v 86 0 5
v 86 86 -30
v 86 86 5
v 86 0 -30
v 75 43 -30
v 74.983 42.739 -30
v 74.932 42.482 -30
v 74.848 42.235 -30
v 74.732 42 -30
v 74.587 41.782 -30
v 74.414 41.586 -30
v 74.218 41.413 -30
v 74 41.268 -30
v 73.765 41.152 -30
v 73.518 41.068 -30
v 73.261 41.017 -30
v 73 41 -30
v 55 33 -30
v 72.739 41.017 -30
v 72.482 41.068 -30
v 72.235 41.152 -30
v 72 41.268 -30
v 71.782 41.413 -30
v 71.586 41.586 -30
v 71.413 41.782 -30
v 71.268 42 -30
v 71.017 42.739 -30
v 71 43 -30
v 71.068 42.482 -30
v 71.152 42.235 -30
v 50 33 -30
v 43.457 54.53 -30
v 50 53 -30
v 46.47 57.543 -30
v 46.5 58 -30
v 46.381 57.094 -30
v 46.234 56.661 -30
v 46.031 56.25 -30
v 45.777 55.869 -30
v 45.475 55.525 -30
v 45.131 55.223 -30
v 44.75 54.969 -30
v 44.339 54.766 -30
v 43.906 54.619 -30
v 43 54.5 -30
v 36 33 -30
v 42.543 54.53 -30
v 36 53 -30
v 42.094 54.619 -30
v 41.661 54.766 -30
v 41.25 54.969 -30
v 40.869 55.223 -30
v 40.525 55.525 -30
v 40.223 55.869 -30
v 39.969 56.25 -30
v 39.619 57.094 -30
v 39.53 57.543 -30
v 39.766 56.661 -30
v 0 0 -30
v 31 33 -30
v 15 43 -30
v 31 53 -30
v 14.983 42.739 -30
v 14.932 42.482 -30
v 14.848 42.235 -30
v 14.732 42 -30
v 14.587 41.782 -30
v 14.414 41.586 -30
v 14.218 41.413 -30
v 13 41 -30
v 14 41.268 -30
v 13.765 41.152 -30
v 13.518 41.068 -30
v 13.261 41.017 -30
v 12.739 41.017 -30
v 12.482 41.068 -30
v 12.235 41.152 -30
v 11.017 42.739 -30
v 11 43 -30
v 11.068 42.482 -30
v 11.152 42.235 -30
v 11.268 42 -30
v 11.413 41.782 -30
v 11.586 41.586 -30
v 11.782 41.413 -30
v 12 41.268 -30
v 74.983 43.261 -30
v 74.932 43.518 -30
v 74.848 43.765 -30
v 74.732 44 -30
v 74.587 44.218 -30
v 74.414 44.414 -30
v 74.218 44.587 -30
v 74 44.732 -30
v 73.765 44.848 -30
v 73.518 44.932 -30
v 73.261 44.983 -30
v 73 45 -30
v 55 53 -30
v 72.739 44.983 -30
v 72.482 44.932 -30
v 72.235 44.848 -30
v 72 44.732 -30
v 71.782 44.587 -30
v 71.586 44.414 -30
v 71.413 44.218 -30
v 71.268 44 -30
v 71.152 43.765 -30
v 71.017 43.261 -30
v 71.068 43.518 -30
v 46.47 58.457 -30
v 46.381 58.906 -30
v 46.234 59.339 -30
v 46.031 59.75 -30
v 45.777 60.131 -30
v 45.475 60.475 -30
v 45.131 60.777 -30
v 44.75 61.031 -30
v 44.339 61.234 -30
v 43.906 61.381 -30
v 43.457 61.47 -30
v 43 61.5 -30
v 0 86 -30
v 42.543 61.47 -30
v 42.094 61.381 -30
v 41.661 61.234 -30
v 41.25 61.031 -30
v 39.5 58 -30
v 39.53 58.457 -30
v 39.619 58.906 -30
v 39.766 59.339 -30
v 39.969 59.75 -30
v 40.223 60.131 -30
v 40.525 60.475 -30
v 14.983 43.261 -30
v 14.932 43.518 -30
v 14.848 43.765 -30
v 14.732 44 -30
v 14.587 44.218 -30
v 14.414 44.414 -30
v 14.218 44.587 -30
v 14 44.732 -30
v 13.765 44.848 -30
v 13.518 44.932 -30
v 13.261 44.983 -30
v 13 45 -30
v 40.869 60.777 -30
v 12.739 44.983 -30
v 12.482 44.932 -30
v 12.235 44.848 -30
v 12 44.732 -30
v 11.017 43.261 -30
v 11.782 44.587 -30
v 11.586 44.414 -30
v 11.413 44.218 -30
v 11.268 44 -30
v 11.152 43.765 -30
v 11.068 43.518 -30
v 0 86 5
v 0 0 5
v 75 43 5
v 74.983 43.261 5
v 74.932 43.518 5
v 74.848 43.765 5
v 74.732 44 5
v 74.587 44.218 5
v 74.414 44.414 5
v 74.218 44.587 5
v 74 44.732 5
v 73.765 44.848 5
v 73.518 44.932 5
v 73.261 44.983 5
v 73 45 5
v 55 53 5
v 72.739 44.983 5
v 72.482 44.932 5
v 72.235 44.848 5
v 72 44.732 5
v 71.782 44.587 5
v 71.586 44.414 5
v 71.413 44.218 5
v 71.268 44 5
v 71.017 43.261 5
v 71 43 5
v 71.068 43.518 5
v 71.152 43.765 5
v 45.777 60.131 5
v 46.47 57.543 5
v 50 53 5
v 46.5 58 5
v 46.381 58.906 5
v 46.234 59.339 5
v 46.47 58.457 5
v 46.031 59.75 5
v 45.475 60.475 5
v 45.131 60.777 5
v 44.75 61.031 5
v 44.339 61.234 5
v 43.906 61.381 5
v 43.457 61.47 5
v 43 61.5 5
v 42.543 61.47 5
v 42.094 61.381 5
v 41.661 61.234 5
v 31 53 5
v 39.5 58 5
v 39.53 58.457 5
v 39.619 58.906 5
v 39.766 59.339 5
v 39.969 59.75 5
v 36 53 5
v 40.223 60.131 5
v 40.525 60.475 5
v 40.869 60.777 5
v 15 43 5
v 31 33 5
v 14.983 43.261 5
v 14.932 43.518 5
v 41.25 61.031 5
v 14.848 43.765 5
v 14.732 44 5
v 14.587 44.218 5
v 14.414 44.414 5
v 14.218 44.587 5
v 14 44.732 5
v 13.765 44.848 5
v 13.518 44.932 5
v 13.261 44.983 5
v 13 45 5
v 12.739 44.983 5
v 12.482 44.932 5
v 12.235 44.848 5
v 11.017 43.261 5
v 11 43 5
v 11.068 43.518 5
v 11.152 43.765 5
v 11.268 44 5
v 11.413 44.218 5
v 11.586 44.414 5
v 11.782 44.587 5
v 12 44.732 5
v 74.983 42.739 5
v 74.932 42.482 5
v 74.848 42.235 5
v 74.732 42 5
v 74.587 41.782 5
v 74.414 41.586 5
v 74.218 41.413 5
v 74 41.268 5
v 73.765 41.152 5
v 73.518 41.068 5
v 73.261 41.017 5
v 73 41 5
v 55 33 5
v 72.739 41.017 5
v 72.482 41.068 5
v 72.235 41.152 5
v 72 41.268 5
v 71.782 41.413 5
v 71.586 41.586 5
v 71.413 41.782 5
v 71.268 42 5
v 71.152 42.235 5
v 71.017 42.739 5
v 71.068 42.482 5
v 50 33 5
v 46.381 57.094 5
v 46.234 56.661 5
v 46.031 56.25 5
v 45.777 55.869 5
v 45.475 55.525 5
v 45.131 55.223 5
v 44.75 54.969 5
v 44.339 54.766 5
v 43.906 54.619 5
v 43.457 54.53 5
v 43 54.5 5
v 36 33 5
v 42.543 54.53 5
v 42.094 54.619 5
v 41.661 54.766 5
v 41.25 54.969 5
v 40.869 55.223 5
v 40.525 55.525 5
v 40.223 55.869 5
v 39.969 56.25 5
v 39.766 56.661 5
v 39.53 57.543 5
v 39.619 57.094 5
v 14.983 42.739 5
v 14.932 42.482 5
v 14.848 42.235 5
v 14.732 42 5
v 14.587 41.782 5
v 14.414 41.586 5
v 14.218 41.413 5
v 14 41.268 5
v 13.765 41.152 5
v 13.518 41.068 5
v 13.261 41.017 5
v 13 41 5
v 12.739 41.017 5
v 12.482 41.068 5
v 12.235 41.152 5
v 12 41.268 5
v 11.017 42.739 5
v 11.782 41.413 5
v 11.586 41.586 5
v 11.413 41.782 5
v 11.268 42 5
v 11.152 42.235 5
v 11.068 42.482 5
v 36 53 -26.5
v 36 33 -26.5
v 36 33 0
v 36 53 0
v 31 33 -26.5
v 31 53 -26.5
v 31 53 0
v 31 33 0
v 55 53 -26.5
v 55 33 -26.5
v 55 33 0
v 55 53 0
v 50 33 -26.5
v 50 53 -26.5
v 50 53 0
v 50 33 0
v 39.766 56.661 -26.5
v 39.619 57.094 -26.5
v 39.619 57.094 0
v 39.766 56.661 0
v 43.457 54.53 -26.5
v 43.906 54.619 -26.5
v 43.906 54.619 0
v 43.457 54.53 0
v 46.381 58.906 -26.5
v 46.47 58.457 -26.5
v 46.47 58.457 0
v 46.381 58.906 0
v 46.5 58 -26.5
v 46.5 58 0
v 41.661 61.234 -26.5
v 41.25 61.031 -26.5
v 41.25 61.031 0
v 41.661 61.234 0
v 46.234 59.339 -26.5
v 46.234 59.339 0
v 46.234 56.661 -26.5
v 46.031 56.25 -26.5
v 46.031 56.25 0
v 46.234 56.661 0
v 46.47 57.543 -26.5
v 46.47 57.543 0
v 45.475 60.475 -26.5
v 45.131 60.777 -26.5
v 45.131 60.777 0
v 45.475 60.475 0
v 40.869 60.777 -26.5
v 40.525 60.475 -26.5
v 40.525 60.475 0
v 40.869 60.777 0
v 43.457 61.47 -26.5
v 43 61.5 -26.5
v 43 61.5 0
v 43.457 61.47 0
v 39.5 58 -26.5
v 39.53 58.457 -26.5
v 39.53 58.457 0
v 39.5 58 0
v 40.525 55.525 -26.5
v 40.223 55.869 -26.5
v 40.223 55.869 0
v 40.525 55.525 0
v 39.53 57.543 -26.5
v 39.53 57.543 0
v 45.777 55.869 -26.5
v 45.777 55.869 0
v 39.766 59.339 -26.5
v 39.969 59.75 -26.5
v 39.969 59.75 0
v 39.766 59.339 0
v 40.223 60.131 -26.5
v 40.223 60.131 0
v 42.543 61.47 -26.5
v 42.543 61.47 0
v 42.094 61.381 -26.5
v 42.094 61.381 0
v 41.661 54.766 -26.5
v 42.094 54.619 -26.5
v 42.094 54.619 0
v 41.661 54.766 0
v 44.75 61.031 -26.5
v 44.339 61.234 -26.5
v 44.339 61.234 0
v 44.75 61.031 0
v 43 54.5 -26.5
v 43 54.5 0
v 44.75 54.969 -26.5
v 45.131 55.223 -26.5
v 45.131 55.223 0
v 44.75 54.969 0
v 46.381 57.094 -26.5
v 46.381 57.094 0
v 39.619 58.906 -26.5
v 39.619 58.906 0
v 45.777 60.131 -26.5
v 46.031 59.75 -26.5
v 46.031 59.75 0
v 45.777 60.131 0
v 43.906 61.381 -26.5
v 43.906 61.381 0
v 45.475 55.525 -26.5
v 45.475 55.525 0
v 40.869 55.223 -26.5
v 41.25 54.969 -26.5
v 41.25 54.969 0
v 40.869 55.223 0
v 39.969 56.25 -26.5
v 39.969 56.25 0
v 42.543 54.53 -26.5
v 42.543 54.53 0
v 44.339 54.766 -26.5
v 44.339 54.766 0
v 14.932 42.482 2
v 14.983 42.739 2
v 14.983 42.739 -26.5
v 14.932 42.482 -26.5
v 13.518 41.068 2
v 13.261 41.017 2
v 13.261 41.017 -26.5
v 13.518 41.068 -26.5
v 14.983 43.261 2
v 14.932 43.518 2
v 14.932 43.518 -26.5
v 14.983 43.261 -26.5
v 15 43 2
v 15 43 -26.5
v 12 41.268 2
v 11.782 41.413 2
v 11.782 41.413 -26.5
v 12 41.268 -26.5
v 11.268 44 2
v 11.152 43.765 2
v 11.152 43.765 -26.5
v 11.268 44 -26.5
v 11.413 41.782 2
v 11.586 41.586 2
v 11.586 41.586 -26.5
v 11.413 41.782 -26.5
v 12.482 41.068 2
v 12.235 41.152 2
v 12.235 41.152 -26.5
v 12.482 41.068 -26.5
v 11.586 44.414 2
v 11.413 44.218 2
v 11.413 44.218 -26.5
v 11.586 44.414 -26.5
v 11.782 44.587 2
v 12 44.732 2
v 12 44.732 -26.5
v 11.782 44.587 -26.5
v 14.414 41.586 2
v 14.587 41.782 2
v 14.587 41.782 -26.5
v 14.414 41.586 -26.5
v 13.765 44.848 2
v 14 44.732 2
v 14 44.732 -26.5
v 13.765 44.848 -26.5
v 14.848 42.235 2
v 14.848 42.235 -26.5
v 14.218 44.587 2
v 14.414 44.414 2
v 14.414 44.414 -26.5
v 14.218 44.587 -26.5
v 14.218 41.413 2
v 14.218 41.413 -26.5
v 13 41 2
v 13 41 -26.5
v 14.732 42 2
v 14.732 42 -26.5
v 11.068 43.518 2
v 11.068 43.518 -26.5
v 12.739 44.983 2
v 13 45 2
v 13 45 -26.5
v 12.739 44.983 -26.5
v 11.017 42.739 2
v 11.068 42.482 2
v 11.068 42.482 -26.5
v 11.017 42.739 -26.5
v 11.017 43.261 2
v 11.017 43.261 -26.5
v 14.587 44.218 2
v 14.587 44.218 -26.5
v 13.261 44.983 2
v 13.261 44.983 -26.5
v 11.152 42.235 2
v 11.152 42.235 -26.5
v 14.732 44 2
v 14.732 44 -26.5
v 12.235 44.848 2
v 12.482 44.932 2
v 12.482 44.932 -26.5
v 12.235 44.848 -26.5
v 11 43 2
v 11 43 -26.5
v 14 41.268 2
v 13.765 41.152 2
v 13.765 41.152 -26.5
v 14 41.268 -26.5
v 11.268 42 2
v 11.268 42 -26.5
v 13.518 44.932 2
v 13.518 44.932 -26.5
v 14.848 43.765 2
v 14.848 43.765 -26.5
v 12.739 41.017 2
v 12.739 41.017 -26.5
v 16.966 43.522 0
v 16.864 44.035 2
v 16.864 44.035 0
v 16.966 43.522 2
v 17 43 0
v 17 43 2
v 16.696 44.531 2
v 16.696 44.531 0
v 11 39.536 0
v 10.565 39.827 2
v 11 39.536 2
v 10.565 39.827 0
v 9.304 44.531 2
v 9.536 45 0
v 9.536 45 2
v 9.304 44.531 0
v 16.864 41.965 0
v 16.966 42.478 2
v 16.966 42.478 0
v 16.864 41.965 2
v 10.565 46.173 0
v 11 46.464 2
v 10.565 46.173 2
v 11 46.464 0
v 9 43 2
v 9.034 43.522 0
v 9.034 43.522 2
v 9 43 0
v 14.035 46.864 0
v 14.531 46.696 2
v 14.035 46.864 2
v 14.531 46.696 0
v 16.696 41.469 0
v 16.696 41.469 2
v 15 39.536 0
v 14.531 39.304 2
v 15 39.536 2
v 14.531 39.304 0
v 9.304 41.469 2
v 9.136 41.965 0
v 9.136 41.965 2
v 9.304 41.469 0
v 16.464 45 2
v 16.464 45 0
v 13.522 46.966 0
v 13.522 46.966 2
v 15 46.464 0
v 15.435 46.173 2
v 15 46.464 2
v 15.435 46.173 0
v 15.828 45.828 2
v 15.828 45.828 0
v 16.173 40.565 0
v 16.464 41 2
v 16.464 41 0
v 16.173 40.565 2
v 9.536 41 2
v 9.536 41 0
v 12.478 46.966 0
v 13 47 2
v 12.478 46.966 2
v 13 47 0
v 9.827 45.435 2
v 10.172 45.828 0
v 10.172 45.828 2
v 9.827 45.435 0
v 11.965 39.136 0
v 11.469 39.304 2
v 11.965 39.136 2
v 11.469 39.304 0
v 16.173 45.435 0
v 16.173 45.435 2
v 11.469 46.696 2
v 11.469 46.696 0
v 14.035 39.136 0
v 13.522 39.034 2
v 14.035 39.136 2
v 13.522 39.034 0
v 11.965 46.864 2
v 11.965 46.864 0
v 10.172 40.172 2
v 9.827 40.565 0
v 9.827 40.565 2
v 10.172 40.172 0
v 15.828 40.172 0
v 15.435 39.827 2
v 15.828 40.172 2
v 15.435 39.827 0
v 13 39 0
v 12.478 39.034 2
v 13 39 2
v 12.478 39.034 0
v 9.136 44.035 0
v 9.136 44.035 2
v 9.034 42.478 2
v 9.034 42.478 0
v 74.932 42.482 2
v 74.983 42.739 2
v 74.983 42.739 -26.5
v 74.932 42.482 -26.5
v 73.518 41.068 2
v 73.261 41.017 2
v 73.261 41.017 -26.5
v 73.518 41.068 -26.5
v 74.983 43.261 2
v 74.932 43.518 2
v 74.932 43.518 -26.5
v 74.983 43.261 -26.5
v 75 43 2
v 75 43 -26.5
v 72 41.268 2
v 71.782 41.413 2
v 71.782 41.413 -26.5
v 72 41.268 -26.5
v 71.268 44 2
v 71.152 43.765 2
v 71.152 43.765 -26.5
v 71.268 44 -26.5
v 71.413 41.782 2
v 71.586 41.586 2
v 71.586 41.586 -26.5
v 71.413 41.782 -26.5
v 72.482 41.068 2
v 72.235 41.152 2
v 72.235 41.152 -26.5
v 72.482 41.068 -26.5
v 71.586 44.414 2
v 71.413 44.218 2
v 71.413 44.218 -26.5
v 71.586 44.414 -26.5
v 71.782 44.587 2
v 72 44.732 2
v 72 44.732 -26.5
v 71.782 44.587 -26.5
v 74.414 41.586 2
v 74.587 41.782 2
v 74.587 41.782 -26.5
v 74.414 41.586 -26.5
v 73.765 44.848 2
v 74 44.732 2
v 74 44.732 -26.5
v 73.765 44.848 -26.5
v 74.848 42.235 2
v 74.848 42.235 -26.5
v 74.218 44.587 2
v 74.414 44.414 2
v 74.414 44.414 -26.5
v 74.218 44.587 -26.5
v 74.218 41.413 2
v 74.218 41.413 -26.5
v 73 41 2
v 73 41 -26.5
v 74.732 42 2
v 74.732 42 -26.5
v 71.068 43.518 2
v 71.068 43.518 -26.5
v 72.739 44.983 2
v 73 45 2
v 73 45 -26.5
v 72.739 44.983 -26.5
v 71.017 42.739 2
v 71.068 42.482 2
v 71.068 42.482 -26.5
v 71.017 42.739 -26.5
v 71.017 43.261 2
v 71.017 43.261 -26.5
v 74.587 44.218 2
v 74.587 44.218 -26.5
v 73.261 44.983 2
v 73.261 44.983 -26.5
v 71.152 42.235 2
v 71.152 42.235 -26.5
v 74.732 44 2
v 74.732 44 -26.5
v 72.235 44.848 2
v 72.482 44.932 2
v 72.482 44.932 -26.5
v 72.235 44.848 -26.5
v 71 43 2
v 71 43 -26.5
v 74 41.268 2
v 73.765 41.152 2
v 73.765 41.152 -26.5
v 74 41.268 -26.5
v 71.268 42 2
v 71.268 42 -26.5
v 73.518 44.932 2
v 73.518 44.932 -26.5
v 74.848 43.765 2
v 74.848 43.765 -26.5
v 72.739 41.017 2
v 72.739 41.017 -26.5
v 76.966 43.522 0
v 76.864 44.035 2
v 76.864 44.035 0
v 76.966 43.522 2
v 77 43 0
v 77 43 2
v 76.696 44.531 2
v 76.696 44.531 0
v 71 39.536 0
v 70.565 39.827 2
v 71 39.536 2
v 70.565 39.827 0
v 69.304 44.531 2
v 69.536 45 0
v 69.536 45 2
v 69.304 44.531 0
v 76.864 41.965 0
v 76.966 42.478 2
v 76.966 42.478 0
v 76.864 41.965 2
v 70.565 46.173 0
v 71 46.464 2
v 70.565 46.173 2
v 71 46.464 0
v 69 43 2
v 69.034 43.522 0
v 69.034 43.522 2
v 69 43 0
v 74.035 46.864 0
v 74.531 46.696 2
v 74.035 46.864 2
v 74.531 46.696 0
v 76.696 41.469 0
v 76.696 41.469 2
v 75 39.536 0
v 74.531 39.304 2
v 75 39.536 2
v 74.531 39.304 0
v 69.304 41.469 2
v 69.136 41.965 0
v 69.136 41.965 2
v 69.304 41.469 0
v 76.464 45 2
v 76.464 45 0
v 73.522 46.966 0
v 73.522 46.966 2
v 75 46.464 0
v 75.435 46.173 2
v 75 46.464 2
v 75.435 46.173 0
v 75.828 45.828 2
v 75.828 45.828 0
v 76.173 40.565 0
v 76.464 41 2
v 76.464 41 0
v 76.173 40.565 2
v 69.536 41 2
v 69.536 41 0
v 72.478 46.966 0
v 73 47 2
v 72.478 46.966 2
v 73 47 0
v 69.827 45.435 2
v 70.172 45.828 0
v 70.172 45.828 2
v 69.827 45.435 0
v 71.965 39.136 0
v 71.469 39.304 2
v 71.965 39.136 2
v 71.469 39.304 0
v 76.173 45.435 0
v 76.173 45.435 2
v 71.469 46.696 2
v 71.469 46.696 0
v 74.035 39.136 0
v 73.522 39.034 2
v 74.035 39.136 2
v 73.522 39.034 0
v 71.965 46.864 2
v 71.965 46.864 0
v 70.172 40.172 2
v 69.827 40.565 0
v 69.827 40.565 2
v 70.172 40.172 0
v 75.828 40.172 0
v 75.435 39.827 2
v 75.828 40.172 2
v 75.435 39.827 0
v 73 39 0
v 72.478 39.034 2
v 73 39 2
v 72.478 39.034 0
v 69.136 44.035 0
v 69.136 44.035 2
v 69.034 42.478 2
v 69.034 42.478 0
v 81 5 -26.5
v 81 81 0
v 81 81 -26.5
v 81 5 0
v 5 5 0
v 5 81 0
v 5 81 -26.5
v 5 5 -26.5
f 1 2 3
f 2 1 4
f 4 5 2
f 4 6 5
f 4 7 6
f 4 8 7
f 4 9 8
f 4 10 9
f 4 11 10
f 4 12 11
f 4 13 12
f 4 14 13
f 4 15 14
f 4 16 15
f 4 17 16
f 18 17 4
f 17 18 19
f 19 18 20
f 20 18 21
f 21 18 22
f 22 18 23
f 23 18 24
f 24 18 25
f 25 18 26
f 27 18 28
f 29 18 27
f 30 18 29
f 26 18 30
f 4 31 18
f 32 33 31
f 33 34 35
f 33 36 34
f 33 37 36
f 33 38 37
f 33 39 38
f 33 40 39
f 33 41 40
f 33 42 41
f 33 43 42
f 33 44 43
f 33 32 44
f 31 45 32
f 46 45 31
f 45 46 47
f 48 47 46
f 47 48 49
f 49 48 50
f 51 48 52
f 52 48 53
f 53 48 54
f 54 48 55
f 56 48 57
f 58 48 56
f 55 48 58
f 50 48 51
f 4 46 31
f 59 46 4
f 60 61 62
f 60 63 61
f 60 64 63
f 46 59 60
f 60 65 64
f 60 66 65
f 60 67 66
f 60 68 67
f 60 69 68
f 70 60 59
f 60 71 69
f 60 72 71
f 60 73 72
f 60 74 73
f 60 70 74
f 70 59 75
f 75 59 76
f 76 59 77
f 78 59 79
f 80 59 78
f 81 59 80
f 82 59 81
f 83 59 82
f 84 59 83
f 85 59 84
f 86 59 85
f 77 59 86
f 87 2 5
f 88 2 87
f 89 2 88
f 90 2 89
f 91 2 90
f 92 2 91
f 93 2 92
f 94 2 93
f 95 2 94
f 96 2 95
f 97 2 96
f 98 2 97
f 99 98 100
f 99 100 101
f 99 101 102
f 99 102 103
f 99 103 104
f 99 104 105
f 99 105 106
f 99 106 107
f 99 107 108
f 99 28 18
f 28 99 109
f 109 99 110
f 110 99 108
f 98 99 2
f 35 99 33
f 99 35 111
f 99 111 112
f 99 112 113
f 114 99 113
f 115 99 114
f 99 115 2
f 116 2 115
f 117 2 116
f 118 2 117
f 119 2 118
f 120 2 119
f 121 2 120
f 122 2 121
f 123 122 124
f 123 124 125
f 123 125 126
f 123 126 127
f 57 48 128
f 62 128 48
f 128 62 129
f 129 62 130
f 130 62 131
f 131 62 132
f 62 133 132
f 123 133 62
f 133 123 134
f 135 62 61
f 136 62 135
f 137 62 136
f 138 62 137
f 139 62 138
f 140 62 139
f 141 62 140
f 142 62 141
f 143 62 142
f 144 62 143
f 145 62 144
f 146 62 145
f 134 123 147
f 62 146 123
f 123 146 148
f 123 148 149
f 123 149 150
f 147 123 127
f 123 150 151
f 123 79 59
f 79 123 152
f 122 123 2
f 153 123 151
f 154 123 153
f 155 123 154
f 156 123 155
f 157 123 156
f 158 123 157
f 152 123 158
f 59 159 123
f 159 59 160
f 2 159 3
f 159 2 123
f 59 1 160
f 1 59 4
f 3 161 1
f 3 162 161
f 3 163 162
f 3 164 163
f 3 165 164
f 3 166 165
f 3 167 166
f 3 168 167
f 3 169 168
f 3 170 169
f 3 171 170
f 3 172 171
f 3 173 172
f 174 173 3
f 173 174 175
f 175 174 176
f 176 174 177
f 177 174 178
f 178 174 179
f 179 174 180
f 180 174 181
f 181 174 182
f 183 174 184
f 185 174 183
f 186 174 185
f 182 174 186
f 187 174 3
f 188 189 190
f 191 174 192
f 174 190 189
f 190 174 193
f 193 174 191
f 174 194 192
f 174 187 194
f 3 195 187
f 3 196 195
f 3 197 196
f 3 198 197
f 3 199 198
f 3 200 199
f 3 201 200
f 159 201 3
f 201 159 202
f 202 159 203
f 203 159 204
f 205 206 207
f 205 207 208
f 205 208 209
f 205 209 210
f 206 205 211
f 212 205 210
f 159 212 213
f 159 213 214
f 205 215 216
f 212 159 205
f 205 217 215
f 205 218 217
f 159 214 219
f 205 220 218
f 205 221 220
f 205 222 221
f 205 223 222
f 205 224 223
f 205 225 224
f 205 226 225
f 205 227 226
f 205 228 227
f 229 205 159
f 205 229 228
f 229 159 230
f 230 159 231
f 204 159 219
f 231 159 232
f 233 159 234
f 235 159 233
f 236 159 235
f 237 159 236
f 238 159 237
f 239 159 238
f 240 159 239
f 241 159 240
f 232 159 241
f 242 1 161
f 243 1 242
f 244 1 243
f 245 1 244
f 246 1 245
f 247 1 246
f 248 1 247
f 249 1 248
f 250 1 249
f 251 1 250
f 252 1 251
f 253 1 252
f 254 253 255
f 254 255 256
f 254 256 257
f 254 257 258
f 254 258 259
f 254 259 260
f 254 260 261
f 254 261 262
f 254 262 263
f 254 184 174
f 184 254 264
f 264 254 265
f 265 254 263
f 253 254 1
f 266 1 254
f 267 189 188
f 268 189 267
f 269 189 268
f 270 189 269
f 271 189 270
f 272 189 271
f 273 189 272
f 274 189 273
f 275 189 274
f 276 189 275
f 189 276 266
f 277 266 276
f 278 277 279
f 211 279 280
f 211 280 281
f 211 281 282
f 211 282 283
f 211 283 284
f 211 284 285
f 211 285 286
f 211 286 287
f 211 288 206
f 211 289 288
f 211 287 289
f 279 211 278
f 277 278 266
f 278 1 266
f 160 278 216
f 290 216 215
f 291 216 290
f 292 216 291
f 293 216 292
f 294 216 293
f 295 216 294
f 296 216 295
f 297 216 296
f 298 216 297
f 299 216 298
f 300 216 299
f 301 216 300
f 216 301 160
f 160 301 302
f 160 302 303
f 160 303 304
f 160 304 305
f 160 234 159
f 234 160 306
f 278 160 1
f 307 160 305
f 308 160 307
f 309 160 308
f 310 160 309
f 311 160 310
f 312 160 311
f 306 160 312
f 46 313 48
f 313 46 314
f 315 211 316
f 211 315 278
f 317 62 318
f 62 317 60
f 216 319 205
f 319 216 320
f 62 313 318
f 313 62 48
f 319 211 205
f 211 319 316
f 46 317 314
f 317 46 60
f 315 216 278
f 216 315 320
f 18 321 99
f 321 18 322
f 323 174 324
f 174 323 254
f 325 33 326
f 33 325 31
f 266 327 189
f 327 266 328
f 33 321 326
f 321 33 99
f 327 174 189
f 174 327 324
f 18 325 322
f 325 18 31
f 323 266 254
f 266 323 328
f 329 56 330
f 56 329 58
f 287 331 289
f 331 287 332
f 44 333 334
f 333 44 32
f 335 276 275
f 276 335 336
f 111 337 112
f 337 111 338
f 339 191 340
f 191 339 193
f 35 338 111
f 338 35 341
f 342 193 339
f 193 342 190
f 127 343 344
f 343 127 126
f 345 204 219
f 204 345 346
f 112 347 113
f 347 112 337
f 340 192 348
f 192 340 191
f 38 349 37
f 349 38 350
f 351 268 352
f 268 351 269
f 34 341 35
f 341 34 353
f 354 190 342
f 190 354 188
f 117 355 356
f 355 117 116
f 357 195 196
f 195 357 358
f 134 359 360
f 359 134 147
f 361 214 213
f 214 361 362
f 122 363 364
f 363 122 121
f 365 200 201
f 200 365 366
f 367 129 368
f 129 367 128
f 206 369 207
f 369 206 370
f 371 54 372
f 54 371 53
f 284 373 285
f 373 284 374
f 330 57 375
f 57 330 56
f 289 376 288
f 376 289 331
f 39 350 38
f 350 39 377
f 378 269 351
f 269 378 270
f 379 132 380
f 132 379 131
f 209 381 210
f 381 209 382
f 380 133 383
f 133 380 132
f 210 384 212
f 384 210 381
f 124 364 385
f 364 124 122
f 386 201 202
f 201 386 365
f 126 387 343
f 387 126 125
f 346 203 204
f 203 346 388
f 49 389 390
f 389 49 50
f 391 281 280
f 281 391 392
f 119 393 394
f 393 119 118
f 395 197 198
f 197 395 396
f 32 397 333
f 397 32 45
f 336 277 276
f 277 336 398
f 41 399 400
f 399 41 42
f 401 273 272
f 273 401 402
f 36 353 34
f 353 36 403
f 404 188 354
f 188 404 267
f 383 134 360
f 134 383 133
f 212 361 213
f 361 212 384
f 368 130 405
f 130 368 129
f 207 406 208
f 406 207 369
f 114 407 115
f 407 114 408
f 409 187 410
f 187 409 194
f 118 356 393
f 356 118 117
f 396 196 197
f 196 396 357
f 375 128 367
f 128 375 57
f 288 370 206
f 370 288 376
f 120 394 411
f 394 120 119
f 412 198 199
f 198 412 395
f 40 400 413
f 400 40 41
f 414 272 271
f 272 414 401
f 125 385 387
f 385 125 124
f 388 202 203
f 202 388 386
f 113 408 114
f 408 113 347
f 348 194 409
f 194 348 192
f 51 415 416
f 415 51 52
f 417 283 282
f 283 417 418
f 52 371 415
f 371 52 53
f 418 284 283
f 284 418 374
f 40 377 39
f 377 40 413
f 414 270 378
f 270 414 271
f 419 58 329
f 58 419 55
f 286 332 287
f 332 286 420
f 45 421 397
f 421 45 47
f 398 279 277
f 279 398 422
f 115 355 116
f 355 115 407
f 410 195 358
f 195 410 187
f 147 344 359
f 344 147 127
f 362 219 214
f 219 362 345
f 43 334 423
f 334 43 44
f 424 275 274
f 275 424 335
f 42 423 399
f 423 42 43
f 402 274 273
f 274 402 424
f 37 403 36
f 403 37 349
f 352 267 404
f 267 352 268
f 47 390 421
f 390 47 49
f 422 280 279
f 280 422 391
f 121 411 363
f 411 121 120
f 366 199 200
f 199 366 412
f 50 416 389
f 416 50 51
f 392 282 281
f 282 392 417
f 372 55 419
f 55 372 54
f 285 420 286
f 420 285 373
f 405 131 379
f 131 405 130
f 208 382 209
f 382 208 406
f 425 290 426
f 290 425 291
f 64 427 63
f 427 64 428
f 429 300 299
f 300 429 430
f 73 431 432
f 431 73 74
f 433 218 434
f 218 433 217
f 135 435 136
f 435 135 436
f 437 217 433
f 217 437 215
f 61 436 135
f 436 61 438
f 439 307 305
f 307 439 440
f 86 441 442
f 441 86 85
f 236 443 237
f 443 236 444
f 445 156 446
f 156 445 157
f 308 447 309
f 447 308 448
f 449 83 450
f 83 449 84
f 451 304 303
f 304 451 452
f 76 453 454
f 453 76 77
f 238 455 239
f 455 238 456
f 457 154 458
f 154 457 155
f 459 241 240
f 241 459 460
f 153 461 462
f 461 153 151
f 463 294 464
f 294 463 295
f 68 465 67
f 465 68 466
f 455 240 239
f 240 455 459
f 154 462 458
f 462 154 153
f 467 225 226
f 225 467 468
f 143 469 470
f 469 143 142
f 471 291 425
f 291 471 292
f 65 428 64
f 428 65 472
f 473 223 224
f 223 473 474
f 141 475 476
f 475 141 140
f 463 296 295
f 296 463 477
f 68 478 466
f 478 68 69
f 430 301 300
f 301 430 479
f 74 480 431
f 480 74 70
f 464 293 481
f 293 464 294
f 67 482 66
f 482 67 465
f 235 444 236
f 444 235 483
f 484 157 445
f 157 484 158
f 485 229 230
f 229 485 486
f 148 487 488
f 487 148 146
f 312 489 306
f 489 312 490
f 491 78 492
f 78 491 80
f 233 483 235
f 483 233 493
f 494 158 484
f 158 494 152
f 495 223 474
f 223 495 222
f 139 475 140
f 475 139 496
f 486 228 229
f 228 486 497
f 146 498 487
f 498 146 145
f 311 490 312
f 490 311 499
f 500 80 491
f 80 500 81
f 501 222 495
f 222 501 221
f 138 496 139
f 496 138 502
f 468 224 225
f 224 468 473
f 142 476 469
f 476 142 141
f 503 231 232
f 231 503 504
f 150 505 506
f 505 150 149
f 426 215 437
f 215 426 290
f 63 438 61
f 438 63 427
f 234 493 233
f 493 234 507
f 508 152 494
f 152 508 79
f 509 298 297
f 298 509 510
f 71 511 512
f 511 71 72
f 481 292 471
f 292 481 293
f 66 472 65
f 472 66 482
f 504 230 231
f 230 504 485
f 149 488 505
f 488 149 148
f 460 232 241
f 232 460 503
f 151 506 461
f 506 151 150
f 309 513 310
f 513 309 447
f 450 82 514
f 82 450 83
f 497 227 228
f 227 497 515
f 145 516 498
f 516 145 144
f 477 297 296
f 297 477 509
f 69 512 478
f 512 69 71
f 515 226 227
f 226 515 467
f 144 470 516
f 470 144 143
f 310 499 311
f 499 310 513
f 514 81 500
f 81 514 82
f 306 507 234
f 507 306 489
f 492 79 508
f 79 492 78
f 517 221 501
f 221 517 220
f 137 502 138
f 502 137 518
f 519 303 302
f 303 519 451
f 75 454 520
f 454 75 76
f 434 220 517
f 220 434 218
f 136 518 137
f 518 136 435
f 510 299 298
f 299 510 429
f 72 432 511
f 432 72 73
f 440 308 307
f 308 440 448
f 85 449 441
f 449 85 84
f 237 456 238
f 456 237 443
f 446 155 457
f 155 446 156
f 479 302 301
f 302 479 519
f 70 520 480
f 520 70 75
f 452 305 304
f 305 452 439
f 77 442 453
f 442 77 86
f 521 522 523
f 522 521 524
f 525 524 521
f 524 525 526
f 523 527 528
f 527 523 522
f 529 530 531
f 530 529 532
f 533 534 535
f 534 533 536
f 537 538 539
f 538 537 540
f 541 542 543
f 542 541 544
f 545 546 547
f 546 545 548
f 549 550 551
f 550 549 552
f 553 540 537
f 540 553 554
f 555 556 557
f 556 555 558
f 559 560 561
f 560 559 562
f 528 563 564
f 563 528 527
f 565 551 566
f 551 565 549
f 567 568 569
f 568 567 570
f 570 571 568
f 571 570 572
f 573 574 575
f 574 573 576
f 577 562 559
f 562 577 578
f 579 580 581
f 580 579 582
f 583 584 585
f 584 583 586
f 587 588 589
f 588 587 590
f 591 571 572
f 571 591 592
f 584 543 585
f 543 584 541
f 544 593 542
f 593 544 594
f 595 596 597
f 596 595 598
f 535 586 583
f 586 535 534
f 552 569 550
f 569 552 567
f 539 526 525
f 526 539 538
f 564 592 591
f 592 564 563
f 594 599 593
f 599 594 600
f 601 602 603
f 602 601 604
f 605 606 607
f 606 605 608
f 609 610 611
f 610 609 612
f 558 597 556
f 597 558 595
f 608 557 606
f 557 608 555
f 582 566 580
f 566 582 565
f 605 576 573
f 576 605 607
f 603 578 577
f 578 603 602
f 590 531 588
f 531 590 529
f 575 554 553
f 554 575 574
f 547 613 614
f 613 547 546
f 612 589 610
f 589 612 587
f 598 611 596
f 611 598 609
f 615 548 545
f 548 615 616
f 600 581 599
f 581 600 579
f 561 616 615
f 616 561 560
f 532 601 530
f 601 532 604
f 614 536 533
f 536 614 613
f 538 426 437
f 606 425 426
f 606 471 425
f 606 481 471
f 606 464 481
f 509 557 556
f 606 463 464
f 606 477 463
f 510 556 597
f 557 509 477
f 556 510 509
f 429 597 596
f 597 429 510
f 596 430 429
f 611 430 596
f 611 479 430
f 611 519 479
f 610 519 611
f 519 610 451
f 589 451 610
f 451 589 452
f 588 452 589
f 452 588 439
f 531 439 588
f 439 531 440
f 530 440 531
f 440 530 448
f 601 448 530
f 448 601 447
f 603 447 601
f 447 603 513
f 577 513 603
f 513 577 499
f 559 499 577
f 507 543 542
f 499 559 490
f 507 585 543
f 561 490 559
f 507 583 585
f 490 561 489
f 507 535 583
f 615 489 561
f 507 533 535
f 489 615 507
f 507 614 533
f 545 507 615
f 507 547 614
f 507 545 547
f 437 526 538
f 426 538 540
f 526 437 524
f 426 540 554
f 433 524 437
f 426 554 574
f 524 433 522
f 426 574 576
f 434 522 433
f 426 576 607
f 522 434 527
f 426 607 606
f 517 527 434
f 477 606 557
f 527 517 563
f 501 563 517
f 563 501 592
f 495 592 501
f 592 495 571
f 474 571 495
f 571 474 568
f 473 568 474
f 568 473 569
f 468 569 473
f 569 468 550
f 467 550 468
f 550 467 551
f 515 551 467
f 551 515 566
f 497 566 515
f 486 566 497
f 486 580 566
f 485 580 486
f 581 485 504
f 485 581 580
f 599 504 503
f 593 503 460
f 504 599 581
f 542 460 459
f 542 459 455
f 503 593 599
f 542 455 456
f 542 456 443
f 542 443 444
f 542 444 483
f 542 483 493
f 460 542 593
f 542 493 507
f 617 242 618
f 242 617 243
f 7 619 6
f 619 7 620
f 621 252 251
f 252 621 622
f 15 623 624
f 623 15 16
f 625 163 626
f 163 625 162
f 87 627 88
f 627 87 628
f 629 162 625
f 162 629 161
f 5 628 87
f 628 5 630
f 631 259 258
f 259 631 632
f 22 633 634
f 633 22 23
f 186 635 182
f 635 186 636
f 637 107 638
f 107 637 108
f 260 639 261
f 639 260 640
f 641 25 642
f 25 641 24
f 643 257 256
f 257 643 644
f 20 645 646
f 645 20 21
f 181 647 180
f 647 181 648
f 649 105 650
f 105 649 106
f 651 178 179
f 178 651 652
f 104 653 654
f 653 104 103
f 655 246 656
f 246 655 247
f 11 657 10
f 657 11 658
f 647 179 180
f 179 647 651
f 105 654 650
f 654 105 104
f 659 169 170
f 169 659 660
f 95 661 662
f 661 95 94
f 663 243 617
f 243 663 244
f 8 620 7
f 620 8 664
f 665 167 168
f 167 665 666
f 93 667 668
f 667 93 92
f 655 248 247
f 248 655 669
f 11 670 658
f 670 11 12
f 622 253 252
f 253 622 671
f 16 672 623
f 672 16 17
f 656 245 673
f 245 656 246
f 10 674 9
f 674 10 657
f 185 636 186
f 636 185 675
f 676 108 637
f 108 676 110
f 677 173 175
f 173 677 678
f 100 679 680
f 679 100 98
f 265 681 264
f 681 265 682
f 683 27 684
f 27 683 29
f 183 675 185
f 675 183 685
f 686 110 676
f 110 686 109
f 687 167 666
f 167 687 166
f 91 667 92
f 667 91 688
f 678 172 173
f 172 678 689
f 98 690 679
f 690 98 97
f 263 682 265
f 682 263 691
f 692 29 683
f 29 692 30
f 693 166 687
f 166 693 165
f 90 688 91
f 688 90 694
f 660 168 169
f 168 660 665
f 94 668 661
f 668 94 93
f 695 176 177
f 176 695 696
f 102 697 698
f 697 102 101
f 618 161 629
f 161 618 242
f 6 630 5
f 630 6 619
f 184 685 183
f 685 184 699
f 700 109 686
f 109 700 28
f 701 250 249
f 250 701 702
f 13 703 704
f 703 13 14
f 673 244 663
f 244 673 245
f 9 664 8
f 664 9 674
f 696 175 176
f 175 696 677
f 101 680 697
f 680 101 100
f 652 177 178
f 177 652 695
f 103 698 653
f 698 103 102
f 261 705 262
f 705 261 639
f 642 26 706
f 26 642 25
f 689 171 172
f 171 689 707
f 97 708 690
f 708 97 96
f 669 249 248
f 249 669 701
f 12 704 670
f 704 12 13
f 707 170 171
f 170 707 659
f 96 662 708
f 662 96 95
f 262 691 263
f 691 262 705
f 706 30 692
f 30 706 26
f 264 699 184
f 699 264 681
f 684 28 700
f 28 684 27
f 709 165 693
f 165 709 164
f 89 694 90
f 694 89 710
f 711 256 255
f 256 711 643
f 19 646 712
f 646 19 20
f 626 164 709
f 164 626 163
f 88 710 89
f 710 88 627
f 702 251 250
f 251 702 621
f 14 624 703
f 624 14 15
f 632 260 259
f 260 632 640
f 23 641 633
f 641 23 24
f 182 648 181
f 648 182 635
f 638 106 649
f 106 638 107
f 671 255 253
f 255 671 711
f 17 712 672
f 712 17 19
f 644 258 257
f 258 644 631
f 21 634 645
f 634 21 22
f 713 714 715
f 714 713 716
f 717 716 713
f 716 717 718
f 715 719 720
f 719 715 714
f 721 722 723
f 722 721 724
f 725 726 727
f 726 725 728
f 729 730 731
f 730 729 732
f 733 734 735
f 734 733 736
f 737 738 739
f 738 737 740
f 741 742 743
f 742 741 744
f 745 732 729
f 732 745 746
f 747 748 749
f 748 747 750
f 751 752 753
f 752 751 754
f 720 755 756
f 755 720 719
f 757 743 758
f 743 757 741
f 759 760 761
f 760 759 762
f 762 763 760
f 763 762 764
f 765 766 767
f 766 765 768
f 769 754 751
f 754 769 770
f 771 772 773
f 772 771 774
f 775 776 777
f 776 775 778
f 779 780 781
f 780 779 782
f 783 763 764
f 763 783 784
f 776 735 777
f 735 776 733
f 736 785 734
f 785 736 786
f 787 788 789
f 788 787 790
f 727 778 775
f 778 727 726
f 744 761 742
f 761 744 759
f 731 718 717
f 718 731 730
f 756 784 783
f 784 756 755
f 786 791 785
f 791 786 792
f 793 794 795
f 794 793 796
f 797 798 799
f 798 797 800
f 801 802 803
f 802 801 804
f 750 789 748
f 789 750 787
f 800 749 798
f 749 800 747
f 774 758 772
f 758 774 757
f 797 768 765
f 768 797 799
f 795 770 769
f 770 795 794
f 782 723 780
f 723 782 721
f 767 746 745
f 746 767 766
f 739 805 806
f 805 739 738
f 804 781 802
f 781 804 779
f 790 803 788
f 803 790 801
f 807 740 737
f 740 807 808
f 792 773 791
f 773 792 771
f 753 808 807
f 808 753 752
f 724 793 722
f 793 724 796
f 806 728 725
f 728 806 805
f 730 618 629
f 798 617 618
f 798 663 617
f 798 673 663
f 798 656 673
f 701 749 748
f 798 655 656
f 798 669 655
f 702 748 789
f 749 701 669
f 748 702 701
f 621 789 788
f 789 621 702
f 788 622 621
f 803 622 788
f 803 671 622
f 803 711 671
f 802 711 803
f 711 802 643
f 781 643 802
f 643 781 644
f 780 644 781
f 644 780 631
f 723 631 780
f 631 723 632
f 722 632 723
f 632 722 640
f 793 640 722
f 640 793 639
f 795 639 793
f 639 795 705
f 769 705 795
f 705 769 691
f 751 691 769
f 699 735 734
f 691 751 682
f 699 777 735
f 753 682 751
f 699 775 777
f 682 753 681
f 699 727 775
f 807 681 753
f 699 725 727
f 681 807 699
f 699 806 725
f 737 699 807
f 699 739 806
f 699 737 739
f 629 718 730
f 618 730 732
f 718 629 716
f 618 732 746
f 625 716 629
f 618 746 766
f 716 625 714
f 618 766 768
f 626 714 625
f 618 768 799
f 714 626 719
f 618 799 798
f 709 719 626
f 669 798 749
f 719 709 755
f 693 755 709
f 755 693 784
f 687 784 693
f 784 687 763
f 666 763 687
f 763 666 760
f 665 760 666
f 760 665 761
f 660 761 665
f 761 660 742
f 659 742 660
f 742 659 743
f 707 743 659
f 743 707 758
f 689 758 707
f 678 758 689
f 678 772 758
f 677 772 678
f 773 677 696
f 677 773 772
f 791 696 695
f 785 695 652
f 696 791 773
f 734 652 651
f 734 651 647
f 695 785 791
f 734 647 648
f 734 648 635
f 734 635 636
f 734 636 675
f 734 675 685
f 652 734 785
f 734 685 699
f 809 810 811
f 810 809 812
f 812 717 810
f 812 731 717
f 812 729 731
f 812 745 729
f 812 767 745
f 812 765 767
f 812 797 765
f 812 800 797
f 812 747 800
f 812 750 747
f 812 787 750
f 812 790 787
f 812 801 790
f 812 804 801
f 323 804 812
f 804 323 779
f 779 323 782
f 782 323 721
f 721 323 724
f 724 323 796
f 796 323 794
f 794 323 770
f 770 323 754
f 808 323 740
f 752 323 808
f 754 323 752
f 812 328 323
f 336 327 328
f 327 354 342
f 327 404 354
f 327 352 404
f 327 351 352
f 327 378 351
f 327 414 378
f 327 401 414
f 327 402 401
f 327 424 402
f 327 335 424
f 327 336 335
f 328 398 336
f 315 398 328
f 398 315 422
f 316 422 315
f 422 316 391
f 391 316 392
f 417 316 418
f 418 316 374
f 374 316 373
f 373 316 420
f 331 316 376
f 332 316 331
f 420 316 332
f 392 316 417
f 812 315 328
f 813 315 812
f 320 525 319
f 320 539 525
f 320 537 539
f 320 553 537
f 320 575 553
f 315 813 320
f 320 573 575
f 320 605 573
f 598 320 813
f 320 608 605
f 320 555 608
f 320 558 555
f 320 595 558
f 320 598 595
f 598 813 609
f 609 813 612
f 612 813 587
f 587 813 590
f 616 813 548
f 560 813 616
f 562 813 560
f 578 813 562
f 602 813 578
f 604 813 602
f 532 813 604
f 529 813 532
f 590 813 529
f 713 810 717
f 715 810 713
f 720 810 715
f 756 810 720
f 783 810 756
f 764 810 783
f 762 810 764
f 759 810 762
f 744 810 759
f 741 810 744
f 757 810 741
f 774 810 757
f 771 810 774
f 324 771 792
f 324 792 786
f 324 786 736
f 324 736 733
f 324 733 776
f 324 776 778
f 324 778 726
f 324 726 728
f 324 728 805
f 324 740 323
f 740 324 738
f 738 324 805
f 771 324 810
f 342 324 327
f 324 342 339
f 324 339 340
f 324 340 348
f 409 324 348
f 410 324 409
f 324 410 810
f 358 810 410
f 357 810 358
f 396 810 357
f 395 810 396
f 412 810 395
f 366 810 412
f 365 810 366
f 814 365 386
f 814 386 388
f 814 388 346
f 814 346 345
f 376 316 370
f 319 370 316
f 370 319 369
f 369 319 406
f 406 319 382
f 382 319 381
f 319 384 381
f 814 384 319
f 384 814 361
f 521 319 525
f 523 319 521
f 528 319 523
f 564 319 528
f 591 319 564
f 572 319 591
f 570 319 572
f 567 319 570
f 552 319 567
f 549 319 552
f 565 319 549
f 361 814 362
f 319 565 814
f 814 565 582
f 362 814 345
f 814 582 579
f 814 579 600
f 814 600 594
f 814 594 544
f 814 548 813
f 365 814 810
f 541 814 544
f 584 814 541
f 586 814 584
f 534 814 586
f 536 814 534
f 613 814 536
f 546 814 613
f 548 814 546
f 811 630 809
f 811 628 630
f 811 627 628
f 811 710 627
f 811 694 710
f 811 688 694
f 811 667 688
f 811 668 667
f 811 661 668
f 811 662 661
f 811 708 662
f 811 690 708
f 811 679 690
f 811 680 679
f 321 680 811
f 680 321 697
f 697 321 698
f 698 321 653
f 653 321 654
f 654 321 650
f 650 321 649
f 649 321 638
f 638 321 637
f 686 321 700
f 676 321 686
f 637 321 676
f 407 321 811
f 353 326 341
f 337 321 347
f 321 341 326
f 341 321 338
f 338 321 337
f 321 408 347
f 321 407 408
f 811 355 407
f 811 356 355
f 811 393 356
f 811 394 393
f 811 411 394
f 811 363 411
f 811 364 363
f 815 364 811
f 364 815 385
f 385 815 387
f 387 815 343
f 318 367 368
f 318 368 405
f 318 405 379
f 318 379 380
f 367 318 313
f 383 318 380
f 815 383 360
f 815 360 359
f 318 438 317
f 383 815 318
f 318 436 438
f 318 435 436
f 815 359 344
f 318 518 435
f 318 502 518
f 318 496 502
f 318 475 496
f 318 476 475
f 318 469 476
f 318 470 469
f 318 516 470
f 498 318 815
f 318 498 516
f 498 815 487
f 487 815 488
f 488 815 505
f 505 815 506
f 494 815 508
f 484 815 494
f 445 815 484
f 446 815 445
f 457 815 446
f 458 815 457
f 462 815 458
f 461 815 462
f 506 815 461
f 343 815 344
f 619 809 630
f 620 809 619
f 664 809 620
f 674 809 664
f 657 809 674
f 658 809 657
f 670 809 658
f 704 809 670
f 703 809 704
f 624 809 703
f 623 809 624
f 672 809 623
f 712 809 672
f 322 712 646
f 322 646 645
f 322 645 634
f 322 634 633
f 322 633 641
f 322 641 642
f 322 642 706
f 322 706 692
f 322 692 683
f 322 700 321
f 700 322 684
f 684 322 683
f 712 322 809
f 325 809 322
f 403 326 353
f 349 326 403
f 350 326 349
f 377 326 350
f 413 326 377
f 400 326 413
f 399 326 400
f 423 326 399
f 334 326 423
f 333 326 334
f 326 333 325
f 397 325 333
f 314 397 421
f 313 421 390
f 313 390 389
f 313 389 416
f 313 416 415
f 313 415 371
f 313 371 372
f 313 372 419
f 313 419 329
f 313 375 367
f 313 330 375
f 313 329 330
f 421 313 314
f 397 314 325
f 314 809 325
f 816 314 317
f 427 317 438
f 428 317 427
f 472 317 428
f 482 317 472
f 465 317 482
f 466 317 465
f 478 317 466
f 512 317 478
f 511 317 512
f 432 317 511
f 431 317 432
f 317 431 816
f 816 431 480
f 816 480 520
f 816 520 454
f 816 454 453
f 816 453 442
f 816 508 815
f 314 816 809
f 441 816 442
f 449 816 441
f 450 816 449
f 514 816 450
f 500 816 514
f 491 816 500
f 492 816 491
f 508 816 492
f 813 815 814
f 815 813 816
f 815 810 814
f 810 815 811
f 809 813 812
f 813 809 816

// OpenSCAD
// Dimensions
faceplate_width = 86;
faceplate_height = 86;
faceplate_thickness = 5;
socket_body_depth = 30;

pin_aperture_width = 5;
pin_aperture_height = 20;
pin_aperture_spacing = 19;
earth_aperture_diameter = 7;

mounting_hole_diameter = 4;
mounting_hole_spacing = 60;
counterbore_diameter = 8;
counterbore_depth = 2;

// Connectivity overlap (1–2mm) to guarantee attachment
overlap = 1.5;

// Main function
module mains_socket() {
    union() {
        // Main blue body with all orange features CUT INTO it (not floating)
        difference() {
            union() {
                socket_body();
                faceplate_profile();
            }
            // Cutouts go slightly beyond the full depth to ensure clean boolean
            pin_apertures();
            internal_hollow();
            mounting_screw_holes();
        }
    }
}

// Socket body
module socket_body() {
    translate([0, 0, -socket_body_depth])
        cube([faceplate_width, faceplate_height, socket_body_depth], center=false);
}

// Faceplate profile
module faceplate_profile() {
    translate([0, 0, 0])
        cube([faceplate_width, faceplate_height, faceplate_thickness], center=false);
}

// Pin apertures (cut into faceplate/body; extend past both sides for robust difference)
module pin_apertures() {
    z0 = -socket_body_depth - overlap;
    h  = socket_body_depth + faceplate_thickness + 2*overlap;

    // Live/Neutral slots
    translate([
        faceplate_width/2 - pin_aperture_spacing/2 - pin_aperture_width/2,
        faceplate_height/2 - pin_aperture_height/2,
        z0
    ])
        cube([pin_aperture_width, pin_aperture_height, h], center=false);

    translate([
        faceplate_width/2 + pin_aperture_spacing/2 - pin_aperture_width/2,
        faceplate_height/2 - pin_aperture_height/2,
        z0
    ])
        cube([pin_aperture_width, pin_aperture_height, h], center=false);

    // Earth pin hole
    translate([
        faceplate_width/2,
        faceplate_height/2 + pin_aperture_height/2 + 5,
        z0
    ])
        cylinder(h=h, d=earth_aperture_diameter, center=false, $fn=48);
}

// Internal hollow (kept inside body; overlaps slightly to avoid thin uncut skins)
module internal_hollow() {
    wall = 5;
    z0 = -socket_body_depth + wall - overlap;
    h  = socket_body_depth - wall + overlap;

    translate([wall, wall, z0])
        cube([faceplate_width - 2*wall, faceplate_height - 2*wall, h], center=false);
}

// Mounting screw holes + counterbores (cut through; extend beyond for robust difference)
module mounting_screw_holes() {
    z0 = -socket_body_depth - overlap;
    h  = socket_body_depth + faceplate_thickness + 2*overlap;

    for (x = [-mounting_hole_spacing/2, mounting_hole_spacing/2]) {
        // Through hole
        translate([faceplate_width/2 + x, faceplate_height/2, z0])
            cylinder(h=h, d=mounting_hole_diameter, center=false, $fn=48);

        // Counterbore from front face (z=0) into faceplate
        translate([faceplate_width/2 + x, faceplate_height/2, -overlap])
            cylinder(h=counterbore_depth + overlap, d=counterbore_diameter, center=false, $fn=48);
    }
}

// Render the mains socket
mains_socket();
